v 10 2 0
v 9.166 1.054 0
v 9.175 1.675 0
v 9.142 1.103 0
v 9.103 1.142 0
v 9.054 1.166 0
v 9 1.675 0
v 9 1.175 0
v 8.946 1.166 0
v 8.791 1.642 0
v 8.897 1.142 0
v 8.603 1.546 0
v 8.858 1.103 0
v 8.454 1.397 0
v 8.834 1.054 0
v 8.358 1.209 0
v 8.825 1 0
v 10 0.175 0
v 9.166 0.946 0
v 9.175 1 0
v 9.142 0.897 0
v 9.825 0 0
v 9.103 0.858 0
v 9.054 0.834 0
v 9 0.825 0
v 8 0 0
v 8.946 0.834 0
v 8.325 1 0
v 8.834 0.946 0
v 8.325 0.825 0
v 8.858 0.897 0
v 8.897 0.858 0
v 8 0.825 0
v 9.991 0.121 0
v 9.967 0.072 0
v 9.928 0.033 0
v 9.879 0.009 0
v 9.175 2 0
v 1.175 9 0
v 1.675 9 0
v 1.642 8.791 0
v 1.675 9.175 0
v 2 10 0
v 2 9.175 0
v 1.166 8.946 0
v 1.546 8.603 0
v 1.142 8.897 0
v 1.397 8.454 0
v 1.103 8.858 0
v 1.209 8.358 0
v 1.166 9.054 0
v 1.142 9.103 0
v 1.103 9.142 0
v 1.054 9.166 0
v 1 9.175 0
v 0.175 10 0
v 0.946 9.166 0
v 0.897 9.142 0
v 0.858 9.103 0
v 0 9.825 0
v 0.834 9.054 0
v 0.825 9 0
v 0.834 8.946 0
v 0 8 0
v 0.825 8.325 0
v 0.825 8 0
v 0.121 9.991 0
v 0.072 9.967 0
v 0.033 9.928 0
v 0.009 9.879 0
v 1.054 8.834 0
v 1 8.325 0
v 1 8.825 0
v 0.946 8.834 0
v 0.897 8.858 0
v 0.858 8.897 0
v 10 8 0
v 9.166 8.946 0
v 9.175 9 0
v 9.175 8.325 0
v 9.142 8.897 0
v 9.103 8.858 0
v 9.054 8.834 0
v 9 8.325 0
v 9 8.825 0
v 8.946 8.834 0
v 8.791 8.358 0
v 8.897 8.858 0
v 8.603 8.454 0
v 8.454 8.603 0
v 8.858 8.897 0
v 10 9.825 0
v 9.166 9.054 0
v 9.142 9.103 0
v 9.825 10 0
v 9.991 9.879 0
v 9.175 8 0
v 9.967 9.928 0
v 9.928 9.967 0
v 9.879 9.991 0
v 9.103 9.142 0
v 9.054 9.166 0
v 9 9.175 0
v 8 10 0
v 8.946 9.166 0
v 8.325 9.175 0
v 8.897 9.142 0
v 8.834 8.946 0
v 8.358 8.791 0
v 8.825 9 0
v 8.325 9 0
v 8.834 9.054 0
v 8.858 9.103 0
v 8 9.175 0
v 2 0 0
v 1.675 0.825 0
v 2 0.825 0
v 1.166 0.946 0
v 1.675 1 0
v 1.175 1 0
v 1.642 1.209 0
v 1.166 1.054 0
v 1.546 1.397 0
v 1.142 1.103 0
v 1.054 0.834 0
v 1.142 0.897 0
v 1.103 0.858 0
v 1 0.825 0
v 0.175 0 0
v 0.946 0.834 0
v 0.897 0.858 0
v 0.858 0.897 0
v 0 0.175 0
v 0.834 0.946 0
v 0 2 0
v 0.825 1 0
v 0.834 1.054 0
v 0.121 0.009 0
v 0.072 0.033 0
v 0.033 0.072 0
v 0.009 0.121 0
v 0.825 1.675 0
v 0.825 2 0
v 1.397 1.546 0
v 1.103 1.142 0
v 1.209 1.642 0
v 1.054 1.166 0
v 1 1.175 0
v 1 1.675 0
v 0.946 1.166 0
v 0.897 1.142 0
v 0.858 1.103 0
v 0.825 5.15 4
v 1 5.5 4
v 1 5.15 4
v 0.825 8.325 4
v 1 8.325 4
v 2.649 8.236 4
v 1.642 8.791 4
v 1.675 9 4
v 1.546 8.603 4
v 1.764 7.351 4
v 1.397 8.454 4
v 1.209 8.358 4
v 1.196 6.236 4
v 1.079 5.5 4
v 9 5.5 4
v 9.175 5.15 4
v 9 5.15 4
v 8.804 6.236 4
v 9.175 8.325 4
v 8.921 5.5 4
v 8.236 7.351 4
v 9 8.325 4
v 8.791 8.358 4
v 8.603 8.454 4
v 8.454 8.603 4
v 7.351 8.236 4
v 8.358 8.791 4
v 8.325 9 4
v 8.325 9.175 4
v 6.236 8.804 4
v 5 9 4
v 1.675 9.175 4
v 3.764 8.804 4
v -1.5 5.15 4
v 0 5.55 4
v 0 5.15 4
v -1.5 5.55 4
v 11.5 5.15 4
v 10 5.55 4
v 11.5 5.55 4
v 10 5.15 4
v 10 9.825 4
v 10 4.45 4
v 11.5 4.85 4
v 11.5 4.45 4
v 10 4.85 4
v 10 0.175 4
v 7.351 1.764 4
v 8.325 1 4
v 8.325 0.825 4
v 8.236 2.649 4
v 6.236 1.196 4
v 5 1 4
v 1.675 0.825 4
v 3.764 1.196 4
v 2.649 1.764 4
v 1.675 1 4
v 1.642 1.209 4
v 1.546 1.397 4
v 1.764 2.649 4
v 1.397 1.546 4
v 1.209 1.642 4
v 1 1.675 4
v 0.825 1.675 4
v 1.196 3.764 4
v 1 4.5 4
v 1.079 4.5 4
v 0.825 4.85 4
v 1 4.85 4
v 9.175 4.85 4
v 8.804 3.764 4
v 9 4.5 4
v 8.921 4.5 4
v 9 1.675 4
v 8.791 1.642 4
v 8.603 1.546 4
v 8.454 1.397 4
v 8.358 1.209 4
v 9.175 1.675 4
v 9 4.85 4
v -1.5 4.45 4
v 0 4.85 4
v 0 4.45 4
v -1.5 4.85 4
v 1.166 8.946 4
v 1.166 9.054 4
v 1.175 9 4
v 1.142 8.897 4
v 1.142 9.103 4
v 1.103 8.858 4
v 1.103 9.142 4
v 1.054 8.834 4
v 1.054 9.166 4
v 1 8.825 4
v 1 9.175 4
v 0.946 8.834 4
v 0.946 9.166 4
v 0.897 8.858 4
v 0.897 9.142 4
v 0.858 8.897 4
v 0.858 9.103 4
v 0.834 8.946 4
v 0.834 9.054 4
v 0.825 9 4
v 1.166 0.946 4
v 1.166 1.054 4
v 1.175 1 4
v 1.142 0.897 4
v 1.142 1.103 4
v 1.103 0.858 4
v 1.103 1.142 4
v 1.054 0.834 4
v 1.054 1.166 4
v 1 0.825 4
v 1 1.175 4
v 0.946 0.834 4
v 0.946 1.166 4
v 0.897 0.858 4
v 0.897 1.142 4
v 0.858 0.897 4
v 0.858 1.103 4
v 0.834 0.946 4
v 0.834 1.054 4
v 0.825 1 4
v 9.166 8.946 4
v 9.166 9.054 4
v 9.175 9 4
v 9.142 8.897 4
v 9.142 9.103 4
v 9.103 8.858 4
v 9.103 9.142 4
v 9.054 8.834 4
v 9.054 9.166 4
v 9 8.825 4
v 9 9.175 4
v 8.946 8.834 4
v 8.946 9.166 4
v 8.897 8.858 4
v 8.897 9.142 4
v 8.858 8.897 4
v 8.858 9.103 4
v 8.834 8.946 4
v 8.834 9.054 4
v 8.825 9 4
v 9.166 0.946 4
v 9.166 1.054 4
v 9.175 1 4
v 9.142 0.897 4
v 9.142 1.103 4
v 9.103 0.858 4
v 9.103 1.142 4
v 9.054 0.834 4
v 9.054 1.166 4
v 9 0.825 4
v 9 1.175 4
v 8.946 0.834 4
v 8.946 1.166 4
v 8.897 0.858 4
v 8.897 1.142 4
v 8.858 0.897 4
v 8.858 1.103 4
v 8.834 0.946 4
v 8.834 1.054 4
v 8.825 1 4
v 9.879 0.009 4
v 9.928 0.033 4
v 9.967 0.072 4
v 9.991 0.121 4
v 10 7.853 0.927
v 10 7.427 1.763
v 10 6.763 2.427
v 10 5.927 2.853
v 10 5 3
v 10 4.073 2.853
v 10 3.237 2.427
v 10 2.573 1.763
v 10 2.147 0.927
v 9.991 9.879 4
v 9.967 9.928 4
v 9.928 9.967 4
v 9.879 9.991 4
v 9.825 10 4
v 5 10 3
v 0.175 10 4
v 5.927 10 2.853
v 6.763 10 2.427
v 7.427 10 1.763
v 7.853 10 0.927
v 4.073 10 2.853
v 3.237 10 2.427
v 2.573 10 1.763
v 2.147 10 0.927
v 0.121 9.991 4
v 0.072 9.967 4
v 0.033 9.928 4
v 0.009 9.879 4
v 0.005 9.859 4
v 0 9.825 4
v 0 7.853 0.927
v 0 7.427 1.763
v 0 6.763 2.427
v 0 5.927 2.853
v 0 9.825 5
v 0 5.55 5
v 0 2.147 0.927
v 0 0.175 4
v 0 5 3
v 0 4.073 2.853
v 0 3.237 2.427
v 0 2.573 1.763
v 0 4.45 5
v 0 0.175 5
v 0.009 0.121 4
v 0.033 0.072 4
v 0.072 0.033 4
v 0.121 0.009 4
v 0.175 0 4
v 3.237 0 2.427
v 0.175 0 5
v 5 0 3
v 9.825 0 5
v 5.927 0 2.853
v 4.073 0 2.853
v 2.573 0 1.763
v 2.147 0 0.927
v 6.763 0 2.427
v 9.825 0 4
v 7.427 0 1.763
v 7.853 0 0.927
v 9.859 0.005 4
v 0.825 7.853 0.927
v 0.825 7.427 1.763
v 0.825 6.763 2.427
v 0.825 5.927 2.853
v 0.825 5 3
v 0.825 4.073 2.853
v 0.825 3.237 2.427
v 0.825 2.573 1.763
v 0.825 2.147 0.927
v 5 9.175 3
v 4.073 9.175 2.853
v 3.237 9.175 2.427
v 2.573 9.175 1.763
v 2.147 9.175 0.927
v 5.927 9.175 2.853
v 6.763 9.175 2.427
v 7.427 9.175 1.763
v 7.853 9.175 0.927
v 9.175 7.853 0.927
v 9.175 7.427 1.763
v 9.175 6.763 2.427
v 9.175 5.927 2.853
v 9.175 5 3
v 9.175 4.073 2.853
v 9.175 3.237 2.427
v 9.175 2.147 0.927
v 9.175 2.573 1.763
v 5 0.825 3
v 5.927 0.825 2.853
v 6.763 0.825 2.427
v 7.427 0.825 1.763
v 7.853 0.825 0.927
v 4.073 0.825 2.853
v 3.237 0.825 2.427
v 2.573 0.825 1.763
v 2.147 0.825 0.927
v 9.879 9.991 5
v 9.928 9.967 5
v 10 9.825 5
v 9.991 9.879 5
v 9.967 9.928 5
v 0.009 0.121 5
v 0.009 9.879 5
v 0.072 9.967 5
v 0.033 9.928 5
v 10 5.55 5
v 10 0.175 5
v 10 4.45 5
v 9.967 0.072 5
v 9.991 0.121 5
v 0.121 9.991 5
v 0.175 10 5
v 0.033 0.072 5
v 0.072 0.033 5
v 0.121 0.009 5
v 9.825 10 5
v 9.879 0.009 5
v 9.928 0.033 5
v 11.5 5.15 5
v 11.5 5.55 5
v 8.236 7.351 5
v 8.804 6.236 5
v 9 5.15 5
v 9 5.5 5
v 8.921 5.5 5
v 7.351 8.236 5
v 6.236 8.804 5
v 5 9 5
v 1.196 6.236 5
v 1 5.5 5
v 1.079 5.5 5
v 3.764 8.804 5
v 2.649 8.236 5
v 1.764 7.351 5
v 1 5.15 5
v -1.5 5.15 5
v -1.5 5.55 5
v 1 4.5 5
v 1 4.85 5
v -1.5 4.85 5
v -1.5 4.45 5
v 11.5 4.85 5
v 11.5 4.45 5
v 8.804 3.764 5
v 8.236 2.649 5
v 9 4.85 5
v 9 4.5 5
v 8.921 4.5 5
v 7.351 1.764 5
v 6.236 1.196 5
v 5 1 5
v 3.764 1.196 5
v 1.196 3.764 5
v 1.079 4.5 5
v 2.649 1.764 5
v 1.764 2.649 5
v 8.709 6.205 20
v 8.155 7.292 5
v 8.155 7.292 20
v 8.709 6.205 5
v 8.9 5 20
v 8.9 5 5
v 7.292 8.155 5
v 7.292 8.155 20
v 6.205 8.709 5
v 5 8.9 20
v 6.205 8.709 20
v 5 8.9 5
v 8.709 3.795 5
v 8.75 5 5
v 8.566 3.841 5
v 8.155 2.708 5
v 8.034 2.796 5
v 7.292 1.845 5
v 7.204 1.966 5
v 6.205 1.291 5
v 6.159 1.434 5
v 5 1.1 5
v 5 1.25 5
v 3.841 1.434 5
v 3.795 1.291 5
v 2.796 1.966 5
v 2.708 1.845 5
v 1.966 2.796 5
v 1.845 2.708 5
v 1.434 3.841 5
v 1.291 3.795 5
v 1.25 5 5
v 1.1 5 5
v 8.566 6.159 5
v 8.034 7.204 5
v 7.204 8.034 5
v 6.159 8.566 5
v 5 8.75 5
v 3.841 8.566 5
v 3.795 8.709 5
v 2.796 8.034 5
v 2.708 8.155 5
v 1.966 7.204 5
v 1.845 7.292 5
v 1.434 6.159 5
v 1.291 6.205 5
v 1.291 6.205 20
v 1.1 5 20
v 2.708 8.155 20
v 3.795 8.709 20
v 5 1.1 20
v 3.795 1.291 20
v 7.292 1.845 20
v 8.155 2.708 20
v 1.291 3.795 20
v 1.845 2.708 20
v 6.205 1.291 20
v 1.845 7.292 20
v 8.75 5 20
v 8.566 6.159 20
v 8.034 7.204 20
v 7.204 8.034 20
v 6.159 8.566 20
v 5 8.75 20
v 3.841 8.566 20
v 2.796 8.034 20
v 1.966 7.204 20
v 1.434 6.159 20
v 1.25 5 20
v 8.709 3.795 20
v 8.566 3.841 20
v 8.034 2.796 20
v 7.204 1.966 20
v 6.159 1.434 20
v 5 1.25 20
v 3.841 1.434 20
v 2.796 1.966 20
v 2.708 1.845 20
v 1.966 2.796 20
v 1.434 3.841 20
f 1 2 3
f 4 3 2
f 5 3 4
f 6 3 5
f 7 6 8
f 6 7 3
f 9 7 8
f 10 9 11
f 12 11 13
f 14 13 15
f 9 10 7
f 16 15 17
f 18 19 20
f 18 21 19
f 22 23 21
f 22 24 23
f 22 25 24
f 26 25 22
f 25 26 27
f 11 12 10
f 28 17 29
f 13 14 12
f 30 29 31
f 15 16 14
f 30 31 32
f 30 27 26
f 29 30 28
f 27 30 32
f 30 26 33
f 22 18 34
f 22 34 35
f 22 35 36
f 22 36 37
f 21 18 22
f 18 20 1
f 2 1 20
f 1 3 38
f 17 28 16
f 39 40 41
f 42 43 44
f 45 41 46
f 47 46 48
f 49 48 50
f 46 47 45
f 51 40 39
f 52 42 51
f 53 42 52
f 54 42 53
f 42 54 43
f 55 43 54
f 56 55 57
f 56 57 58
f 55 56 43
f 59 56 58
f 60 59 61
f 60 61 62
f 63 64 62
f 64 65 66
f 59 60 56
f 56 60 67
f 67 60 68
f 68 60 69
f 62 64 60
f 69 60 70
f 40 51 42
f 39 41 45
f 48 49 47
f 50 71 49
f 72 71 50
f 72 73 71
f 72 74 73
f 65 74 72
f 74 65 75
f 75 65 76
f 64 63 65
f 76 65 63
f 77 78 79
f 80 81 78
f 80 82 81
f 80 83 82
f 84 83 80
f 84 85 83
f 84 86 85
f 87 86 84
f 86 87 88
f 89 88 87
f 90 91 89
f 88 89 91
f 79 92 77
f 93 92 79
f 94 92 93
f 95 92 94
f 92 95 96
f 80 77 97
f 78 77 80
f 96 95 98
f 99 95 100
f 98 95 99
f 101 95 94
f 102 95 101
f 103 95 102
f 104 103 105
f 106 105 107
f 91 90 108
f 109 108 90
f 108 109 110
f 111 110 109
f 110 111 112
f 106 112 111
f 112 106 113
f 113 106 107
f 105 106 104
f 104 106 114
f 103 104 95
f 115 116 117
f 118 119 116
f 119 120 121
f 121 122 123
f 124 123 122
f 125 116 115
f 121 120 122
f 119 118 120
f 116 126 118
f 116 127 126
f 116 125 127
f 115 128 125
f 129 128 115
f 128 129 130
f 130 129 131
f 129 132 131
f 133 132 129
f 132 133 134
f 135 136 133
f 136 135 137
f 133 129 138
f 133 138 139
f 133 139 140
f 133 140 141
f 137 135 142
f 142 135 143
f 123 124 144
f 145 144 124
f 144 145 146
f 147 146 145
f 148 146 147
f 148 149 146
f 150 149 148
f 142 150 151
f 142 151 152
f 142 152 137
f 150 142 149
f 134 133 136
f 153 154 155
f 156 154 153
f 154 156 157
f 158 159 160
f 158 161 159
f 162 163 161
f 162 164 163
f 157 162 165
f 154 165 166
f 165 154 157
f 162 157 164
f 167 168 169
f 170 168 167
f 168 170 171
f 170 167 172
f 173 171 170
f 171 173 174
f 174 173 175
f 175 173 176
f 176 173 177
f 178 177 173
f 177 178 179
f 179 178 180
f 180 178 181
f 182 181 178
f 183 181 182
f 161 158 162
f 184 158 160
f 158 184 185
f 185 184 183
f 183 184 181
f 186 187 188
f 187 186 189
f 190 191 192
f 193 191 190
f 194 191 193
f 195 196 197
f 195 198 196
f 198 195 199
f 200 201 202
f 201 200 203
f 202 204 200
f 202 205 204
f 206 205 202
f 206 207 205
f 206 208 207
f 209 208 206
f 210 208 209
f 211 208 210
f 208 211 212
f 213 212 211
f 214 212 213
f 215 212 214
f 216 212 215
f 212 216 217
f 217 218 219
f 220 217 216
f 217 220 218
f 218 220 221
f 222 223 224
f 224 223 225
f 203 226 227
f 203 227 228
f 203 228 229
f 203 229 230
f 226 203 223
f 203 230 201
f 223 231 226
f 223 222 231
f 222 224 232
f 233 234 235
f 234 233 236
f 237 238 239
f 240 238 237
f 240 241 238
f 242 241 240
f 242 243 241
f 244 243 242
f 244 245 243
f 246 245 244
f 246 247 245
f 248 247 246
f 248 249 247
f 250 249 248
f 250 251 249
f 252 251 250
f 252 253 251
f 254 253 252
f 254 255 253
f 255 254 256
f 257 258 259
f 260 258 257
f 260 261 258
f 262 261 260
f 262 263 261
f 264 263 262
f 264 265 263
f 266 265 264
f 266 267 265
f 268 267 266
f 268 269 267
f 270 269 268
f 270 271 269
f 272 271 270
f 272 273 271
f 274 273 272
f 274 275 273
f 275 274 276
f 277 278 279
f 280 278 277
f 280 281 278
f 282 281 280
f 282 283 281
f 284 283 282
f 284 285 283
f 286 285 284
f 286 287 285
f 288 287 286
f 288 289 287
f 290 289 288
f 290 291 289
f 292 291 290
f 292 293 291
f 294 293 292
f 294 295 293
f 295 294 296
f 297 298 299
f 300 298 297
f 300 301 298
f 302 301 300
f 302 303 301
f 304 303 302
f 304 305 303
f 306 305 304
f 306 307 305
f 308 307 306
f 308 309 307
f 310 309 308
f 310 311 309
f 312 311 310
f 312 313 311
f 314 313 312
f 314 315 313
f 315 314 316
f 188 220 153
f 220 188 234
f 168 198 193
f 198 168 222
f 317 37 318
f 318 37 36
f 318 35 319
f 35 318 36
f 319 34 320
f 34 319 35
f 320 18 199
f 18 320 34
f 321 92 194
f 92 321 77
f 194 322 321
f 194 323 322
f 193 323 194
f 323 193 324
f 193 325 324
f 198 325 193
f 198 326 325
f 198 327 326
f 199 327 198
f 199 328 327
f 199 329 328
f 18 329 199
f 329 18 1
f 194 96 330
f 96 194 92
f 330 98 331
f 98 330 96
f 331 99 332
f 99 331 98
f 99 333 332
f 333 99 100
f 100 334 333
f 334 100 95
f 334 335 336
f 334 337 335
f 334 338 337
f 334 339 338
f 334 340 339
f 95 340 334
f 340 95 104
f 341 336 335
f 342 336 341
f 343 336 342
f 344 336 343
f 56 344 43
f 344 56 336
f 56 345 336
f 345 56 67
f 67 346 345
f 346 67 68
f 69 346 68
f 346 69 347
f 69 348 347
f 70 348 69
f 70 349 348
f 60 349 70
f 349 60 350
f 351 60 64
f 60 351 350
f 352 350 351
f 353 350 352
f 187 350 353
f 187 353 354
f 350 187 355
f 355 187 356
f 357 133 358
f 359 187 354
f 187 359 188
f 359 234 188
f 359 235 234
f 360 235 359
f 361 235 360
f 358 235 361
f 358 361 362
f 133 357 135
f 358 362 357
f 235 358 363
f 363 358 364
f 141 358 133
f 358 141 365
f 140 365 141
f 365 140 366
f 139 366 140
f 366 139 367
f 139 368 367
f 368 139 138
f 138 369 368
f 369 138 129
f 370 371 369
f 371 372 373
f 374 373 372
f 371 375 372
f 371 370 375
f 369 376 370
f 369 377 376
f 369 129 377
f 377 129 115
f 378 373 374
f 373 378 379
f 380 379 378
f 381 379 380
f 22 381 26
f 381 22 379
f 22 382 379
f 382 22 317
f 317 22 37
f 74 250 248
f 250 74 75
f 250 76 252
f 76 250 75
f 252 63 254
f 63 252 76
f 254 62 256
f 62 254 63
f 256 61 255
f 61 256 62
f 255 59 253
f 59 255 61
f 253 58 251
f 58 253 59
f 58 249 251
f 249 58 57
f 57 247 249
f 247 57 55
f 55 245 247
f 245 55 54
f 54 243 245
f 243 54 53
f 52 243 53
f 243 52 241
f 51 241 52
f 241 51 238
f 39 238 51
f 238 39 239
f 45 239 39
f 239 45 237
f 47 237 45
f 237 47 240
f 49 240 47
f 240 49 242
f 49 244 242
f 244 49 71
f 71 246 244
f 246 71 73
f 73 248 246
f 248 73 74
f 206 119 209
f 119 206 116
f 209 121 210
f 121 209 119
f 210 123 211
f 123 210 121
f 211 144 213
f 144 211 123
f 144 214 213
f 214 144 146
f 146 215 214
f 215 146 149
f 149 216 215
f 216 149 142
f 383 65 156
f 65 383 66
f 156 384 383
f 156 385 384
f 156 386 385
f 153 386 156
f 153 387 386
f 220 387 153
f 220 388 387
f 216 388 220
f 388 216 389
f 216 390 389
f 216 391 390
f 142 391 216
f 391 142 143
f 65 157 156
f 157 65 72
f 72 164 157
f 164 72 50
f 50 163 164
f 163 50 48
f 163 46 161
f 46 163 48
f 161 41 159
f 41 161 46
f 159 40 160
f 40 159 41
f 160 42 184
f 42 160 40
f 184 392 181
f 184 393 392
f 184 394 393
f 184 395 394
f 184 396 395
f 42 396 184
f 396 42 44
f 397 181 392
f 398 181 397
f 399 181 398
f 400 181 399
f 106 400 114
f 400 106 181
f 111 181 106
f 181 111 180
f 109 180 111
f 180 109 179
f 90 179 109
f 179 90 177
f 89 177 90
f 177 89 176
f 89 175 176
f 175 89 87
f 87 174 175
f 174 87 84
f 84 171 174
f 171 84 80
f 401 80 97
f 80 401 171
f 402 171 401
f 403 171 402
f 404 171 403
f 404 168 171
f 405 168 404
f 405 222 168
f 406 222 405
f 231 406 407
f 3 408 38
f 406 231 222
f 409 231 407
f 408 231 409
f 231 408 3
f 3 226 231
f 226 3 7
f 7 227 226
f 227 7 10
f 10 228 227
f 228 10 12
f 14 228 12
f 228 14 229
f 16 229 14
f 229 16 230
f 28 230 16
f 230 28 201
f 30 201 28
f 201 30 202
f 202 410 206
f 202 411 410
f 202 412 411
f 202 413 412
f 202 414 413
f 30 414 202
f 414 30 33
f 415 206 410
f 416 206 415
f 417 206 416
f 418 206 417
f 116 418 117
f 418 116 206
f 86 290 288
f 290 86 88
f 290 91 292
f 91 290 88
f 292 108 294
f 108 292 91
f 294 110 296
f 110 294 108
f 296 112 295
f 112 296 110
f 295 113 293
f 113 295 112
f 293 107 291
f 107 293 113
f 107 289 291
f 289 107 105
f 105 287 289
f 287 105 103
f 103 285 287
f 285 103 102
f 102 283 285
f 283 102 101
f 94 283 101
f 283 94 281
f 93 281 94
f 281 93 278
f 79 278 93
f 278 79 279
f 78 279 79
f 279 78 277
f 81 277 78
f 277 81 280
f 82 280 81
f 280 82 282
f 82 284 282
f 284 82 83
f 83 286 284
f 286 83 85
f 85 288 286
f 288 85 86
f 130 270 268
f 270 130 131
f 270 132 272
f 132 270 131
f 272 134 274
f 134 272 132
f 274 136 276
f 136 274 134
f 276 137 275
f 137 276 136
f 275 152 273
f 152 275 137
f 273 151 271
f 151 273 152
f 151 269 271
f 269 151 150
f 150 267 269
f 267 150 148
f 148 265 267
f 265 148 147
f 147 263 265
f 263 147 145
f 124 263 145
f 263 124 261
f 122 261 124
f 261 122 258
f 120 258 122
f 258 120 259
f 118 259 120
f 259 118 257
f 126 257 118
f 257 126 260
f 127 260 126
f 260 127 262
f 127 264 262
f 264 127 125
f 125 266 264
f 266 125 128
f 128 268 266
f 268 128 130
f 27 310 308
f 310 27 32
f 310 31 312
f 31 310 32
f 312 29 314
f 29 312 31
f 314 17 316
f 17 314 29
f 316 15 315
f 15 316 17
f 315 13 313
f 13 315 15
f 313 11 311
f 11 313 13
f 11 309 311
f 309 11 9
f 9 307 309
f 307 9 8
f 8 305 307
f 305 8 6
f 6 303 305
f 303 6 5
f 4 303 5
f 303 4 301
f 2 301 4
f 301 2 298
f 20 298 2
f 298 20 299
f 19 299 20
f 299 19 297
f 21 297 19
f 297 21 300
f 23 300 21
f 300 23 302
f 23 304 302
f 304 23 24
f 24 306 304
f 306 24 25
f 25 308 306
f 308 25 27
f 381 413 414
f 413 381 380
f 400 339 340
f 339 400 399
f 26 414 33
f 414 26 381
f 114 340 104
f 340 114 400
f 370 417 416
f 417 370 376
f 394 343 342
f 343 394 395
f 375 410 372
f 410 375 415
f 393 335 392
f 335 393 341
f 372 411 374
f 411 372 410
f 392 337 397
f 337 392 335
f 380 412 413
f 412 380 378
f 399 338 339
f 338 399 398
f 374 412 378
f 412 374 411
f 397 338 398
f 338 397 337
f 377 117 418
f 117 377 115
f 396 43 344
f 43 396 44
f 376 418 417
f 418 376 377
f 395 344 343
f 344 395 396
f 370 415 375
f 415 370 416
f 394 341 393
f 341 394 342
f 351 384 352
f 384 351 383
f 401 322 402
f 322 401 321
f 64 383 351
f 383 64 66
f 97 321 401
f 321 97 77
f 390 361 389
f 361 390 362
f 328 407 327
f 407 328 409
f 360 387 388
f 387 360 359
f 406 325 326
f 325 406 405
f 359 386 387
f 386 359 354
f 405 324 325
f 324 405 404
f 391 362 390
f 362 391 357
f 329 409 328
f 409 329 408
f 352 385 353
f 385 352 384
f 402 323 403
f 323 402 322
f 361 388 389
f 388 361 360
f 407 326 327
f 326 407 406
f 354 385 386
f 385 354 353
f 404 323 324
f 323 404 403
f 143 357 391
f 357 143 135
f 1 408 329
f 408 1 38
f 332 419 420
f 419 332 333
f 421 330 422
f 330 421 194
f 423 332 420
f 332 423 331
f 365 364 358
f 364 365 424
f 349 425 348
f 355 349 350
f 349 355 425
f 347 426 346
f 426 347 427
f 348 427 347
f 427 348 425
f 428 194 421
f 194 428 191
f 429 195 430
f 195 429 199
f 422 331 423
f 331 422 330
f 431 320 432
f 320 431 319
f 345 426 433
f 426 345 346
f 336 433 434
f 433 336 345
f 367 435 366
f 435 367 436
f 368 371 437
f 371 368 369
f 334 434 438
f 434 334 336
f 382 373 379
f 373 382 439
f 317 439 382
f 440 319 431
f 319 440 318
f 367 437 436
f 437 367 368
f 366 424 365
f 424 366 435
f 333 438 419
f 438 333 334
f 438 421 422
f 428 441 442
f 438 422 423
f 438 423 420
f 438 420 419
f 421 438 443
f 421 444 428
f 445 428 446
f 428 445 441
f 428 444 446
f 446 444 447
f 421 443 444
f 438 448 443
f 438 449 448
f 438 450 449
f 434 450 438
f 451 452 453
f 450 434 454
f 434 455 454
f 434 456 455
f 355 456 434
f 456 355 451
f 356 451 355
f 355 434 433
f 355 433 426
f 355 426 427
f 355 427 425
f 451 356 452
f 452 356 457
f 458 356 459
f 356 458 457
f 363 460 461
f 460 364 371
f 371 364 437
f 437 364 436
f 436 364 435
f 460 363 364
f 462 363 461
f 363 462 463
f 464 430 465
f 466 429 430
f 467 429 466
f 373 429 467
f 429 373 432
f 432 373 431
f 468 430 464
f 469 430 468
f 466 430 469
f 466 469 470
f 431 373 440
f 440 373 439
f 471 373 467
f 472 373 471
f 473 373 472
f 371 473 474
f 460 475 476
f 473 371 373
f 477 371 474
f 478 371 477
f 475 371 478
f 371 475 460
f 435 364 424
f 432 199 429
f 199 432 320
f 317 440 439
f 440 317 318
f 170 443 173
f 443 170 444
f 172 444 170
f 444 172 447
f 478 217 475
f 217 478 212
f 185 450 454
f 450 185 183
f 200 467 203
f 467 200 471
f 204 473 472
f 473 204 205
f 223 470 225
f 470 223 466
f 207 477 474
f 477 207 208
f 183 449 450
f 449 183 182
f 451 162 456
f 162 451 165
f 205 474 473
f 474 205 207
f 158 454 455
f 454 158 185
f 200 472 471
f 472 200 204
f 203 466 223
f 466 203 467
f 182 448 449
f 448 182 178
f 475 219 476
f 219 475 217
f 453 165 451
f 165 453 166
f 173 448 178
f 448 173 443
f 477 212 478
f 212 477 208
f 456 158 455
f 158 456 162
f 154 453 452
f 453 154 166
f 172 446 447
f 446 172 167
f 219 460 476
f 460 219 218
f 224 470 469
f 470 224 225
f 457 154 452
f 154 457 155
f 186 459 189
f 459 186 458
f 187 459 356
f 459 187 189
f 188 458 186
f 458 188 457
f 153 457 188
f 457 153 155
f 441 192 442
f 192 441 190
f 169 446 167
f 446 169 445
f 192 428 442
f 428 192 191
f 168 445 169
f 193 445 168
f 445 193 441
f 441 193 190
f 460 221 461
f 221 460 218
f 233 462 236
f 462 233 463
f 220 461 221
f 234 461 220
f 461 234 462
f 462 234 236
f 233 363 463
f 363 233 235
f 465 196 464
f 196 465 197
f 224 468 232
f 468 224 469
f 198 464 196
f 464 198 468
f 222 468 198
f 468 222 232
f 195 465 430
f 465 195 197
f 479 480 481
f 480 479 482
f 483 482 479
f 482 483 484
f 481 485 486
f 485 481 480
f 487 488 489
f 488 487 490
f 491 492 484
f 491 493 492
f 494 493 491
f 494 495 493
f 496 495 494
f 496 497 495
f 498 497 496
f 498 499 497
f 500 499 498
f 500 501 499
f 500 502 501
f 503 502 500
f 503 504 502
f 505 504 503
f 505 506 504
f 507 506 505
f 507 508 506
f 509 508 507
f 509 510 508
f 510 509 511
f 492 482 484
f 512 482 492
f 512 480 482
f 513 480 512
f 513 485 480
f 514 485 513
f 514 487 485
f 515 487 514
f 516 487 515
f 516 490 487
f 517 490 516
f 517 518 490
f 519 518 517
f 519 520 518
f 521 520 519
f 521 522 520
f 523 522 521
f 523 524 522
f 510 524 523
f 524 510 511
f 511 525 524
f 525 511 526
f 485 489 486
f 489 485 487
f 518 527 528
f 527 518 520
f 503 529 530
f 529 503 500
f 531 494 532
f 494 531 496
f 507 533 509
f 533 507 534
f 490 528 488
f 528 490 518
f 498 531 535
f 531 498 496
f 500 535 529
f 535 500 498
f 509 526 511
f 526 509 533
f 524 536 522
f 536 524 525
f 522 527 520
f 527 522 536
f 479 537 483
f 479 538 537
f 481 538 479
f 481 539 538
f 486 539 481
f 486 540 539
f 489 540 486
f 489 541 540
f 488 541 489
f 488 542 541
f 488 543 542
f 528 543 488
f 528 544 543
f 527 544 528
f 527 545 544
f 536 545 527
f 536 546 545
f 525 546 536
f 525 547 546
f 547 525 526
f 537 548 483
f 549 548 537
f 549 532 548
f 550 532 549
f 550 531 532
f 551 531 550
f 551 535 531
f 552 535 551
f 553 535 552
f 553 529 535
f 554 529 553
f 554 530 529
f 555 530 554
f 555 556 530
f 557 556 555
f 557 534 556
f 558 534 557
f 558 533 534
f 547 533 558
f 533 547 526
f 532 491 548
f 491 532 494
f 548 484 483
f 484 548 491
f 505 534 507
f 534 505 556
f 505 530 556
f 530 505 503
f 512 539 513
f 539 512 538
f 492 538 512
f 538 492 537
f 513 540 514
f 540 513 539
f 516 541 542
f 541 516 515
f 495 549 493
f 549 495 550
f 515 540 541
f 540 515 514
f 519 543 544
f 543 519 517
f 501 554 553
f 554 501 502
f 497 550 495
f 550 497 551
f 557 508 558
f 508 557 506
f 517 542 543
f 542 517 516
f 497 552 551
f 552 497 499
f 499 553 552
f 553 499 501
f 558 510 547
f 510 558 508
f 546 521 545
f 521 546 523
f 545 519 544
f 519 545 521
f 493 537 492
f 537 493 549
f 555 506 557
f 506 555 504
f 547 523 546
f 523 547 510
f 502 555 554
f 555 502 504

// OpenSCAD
/*
Title: Hair Dryer Fan Holder Base
Copyright: Jet Flener 2024
Author: Jet Flener - jetflener@ou.edu
License: GNU GPL v3
Encoding: UTF-8
Version: 0.1.0-alpha
Description: An adapter to hold a hair dryer fan, for use with a duct.

This code has units in cm. Rescale for printing. The original design for the mount is taken from OPENSCAD Library file by the DoomMeister Mounting surround for small DC fans (25 - 120mm).  Clamps require an M3 bolt.
*/

//render everything
render(){
    difference(){
        fan_mount(size=10,thick=4);
        
         translate([5, 10, 0])rotate([90, 0, 0])fanBaseCutOut();
            translate([0, 5, 0])rotate([90, 0, 90])fanBaseCutOut();
        
    }
    
    
    translate([0, 0, 4])fanDuctBasePlate();
    
    
    translate([0, 0, 5])fanDuct();
    
    
}

module fanBaseCutOut(){
    cylinder(10, r = 3);
    $fn=20;
}
module fanDuctBasePlate(){
    
    difference(){
        roundedcube([10, 10, 1], radius = 0.35/2, apply_to = "z");
        translate([5, 5, 0])cylinder(h = 1, d = 8);
        
        //spilt plate
        translate([0, 5, 0])cube([10, 0.5, 1]);
        translate([0, 4.5, 0])cube([10, 0.5, 1]);
        
    }
    
    //clamps
        translate([-1.5, 5.15, 0])cube([2.5, 0.4, 1]);
        translate([9, 5.15, 0])cube([2.5, 0.4, 1]);
    
        translate([-1.5, 4.45, 0])cube([2.5, 0.4, 1]);
        translate([9, 4.45, 0])cube([2.5, 0.4, 1]);
    
    $fn = 20; 
}

module fanDuct(){
    translate([5, 5, 0])difference(){
        cylinder(h = 15, d = 7.8);
        cylinder(h = 15, d = 7.5);
        
    }
    
    
    //need to add rotated cylinder
    
    $fn = 20;
}


































//rounded cube for jet
// Higher definition curves
//$fs = 0.01;

module roundedcube(size = [1, 1, 1], center = false, radius = 0.5, apply_to = "all") {
    $fs = 0.1;
	// If single value, convert to [x, y, z] vector
	size = (size[0] == undef) ? [size, size, size] : size;

	translate_min = radius;
	translate_xmax = size[0] - radius;
	translate_ymax = size[1] - radius;
	translate_zmax = size[2] - radius;

	diameter = radius * 2;

	module build_point(type = "sphere", rotate = [0, 0, 0]) {
		if (type == "sphere") {
			sphere(r = radius);
		} else if (type == "cylinder") {
			rotate(a = rotate)
			cylinder(h = diameter, r = radius, center = true);
		}
	}

	obj_translate = (center == false) ?
		[0, 0, 0] : [
			-(size[0] / 2),
			-(size[1] / 2),
			-(size[2] / 2)
		];

	translate(v = obj_translate) {
		hull() {
			for (translate_x = [translate_min, translate_xmax]) {
				x_at = (translate_x == translate_min) ? "min" : "max";
				for (translate_y = [translate_min, translate_ymax]) {
					y_at = (translate_y == translate_min) ? "min" : "max";
					for (translate_z = [translate_min, translate_zmax]) {
						z_at = (translate_z == translate_min) ? "min" : "max";

						translate(v = [translate_x, translate_y, translate_z])
						if (
							(apply_to == "all") ||
							(apply_to == "xmin" && x_at == "min") || (apply_to == "xmax" && x_at == "max") ||
							(apply_to == "ymin" && y_at == "min") || (apply_to == "ymax" && y_at == "max") ||
							(apply_to == "zmin" && z_at == "min") || (apply_to == "zmax" && z_at == "max")
						) {
							build_point("sphere");
						} else {
							rotate = 
								(apply_to == "xmin" || apply_to == "xmax" || apply_to == "x") ? [0, 90, 0] : (
								(apply_to == "ymin" || apply_to == "ymax" || apply_to == "y") ? [90, 90, 0] :
								[0, 0, 0]
							);
							build_point("cylinder", rotate);
						}
					}
				}
			}
		}
	}
}


//fan stuff
module fan_mount(size=40,thick = 4)
{
if(size == 18)
    {
	_fan_mount(
			fan_size = 18,
			fan_mounting_pitch = 15.22,
			fan_m_hole_dia = .35,
			holder_thickness = thick
		 );
	}
if(size == 10)
	{
	_fan_mount(
			fan_size = 10,
			fan_mounting_pitch = 8,
			fan_m_hole_dia = .35,
			holder_thickness = thick
		 );
	}
if(size == 30)
	{
	_fan_mount(
			fan_size = 30,
			fan_mounting_pitch = 24,
			fan_m_hole_dia = 3,
			holder_thickness = thick
		 );
	}

if(size == 40)
	{
	_fan_mount(
			fan_size = 40,
			fan_mounting_pitch = 32,
			fan_m_hole_dia = 3.5,
			holder_thickness = thick
		 );
	}
if(size == 45)
	{
	_fan_mount(
			fan_size = 45,
			fan_mounting_pitch = 37,
			fan_m_hole_dia = 4.3,
			holder_thickness = thick
		 );
	}
if(size == 60)
	{
	_fan_mount(
			fan_size = 60,
			fan_mounting_pitch = 50,
			fan_m_hole_dia = 4.4,
			holder_thickness = thick
		 );
	}
if(size == 80)
	{
	_fan_mount(
			fan_size = 80,
			fan_mounting_pitch = 71.5,
			fan_m_hole_dia = 4.4,
			holder_thickness = thick
		 );
	}

if(size == 120)
	{
	_fan_mount(
			fan_size = 120,
			fan_mounting_pitch = 105,
			fan_m_hole_dia = 4.4,
			holder_thickness = thick
		 );
	}
}


//inner module
module _fan_mount(
			fan_size, //nominsl size of fan
			fan_mounting_pitch, //pitch between mounting holes
			fan_m_hole_dia, //mounting hole diameter
			holder_thickness //user defined thickness
		 )
{

offset1 = (fan_size-(fan_mounting_pitch + fan_m_hole_dia))/2;
offset2 = (fan_size-(fan_mounting_pitch))/2;
offset3 = offset2 + fan_mounting_pitch;
thickness = (fan_size-fan_mounting_pitch)/2;	
			
			//difference()
			//{
			linear_extrude(height = holder_thickness)
			union()
			{	
			difference()
			{
				translate([fan_m_hole_dia/2,fan_m_hole_dia/2,0])
				minkowski()
				{	
					square([fan_size - fan_m_hole_dia,fan_size - fan_m_hole_dia]);
					circle(r= fan_m_hole_dia/2, $fn=20);
				}
			
					translate([offset1,offset1,0])
					square([fan_mounting_pitch + fan_m_hole_dia,fan_mounting_pitch + fan_m_hole_dia]);
				}
				translate([offset2,offset2,0])
				rotate([0,0,0])_corner_hole();
				translate([offset3,offset2,0])
				rotate([0,0,90])_corner_hole();
				translate([offset2,offset3,0])
				rotate([0,0,90])_corner_hole();
				translate([offset3,offset3,0])
				rotate([0,0,0])_corner_hole();
			}

module _corner_hole()
{
				difference(){
					union(){
							difference(){
							square([fan_m_hole_dia + thickness,fan_m_hole_dia + thickness],center=true);
							square([(fan_m_hole_dia + thickness)/2,(fan_m_hole_dia + thickness)/2],center=false);
							translate([-(fan_m_hole_dia + thickness)/2,-(fan_m_hole_dia + thickness)/2])
							square([(fan_m_hole_dia + thickness)/2,(fan_m_hole_dia + thickness)/2],center=false);
							}
					circle(r=(fan_m_hole_dia + thickness)/2, $fn=20);
					}
					circle(r=(fan_m_hole_dia)/2, $fn=20);
				}
}


echo(offset1,offset2,thickness);
}
